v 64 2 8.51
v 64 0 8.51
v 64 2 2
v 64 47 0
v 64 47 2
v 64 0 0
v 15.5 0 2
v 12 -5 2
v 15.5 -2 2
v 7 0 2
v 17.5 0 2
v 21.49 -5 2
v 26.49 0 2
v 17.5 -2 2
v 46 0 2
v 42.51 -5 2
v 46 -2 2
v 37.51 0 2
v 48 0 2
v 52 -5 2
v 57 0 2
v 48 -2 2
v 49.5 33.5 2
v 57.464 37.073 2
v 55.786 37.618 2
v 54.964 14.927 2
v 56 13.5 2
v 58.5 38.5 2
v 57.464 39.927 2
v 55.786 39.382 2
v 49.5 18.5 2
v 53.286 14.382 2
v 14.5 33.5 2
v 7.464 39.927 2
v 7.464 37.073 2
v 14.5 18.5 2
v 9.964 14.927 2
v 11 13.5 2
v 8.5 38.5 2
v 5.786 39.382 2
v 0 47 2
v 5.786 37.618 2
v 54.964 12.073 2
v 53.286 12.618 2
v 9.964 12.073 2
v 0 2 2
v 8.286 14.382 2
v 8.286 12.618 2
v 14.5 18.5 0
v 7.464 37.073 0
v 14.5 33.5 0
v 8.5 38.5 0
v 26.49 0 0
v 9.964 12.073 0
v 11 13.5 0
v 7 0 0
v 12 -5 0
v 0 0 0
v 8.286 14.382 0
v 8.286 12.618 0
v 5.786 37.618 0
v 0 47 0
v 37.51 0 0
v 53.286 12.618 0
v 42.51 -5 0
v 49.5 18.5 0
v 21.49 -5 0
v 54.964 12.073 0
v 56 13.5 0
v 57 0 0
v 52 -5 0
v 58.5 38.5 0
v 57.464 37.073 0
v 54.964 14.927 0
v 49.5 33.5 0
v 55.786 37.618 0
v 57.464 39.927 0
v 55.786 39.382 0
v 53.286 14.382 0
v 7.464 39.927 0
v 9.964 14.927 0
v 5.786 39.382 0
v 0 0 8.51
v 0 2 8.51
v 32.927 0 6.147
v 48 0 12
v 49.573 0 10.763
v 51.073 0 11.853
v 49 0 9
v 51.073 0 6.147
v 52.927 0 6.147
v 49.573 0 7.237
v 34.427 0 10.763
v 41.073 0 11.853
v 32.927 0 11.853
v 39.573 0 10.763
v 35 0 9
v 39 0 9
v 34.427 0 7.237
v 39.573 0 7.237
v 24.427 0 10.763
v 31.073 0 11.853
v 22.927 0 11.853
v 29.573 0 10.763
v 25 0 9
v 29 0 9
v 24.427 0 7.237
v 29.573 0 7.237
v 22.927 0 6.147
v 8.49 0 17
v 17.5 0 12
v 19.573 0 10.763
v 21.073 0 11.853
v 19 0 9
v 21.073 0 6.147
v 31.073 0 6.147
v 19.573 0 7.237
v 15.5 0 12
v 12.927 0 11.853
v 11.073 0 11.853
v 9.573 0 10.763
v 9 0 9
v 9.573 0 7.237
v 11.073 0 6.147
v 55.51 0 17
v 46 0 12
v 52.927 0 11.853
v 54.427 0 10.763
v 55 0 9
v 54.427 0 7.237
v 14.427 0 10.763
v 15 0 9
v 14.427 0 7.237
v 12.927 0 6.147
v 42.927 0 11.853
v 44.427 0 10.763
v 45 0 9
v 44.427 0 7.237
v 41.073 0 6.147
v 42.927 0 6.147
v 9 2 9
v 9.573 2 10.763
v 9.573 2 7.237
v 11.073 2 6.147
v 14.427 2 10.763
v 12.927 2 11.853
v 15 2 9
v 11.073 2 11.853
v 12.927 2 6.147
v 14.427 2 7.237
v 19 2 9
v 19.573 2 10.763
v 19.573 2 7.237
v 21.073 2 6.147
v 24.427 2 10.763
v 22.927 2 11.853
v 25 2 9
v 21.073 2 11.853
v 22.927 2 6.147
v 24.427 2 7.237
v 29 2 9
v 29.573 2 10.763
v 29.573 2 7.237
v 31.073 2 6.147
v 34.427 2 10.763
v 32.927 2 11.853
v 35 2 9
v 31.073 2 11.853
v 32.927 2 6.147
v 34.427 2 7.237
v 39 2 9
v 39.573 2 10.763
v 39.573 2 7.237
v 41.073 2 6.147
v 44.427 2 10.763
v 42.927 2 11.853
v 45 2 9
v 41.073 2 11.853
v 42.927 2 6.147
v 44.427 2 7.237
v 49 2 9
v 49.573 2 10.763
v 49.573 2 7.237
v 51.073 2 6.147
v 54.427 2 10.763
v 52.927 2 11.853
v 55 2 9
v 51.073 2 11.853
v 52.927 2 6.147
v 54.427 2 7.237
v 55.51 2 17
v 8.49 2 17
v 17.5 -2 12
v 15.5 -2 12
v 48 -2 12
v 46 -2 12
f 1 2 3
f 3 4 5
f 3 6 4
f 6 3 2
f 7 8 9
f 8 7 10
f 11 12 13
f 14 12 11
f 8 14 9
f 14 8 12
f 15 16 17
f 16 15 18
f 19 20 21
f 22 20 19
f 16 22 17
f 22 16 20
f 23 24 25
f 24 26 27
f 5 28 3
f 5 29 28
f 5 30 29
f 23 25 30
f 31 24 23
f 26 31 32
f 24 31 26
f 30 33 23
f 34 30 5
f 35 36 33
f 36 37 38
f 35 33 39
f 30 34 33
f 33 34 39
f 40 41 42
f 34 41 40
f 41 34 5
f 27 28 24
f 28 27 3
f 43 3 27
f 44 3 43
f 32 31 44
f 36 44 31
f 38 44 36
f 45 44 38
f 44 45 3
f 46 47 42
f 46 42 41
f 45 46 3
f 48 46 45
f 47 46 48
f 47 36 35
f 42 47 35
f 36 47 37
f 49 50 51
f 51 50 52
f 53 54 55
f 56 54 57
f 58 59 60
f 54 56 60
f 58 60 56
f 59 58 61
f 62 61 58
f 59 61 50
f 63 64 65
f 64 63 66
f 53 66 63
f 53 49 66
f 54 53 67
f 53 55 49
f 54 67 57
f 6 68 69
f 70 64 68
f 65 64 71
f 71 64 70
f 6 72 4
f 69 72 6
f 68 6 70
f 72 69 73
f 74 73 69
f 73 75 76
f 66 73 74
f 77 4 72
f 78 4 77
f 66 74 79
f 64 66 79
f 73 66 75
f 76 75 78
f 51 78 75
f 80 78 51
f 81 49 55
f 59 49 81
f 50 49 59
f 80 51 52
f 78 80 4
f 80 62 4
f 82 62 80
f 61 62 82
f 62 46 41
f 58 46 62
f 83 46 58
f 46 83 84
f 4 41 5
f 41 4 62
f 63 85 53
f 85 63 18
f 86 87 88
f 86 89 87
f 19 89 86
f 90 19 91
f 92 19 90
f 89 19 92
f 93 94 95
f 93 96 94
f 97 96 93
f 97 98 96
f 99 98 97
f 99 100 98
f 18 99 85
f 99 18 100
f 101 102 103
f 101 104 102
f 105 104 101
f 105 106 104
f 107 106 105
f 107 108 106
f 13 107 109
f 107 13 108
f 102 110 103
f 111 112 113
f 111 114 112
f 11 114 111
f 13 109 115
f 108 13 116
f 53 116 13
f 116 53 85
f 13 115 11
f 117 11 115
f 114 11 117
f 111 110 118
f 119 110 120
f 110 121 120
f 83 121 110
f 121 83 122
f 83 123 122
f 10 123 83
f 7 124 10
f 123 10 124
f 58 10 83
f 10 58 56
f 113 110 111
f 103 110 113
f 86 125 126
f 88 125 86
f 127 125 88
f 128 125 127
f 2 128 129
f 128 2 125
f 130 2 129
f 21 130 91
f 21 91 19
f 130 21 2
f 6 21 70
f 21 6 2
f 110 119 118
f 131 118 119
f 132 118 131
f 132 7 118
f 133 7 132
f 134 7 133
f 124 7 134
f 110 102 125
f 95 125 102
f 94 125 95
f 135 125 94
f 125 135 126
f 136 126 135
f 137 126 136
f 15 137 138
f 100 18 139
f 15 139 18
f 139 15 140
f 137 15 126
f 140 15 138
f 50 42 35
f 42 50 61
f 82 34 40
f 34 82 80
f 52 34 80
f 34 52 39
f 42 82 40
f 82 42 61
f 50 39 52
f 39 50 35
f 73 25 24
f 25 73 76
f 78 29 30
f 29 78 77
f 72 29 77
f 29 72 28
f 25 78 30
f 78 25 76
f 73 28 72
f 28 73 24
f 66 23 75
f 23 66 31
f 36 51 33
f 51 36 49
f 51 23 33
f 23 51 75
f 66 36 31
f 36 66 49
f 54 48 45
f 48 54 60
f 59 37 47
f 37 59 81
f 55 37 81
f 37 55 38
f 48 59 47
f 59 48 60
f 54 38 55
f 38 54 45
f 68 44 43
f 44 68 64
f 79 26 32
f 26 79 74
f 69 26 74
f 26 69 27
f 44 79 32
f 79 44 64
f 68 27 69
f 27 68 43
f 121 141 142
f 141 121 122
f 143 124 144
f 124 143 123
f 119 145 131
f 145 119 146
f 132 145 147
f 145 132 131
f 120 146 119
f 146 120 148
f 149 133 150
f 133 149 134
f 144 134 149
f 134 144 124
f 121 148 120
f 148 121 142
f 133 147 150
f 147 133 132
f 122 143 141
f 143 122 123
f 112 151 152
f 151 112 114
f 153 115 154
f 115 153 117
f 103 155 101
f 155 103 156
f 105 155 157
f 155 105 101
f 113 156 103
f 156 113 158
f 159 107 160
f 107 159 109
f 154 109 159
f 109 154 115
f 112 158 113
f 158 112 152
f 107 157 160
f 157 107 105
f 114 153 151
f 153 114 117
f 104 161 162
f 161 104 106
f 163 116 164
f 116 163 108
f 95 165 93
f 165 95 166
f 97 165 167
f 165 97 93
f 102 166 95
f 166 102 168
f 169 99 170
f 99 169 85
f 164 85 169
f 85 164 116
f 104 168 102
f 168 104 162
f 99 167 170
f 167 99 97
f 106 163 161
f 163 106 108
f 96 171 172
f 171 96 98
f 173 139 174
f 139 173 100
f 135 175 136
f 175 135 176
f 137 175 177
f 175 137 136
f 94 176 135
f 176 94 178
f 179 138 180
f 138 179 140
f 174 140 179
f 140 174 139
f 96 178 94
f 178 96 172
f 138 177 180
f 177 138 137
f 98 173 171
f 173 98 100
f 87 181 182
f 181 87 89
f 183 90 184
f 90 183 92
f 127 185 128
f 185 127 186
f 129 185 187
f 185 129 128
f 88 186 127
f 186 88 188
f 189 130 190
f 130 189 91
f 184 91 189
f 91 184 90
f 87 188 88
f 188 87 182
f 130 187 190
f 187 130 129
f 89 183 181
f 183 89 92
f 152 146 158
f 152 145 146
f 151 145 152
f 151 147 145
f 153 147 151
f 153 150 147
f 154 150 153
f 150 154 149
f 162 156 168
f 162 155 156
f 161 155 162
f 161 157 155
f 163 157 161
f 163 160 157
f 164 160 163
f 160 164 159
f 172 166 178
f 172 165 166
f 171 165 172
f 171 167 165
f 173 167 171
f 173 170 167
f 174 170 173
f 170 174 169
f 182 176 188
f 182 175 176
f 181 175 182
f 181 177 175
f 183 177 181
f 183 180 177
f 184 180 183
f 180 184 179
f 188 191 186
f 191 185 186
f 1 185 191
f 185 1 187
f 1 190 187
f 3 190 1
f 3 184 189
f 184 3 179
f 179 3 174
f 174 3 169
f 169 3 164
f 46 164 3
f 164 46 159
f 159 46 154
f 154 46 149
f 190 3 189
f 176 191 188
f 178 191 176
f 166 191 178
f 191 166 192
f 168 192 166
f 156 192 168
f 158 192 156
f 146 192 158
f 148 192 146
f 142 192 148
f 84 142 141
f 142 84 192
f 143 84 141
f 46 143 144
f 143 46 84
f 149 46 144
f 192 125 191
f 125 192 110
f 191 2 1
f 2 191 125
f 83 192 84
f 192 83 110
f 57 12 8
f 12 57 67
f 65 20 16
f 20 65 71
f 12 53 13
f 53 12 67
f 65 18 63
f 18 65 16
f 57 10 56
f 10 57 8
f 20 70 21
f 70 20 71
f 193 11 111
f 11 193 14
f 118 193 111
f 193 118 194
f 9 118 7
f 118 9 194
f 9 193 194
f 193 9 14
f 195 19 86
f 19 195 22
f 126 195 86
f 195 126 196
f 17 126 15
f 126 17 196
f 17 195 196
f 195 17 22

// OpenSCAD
difference() {
    cube([64, 47, 2]);

    translate([7, 38.5, -0.25]) cylinder(h = 2.5, r=1.5);
    translate([57, 38.5, -0.25]) cylinder(h = 2.5, r=1.5);
    
    translate([14.5, 18.5, -0.25]) cube([35 , 15, 2.5]);
    
    translate([9.5, 13.5, -0.25]) cylinder(h = 2.5, r=1.5);
    translate([54.5, 13.5, -0.25]) cylinder(h = 2.5, r=1.5);
}


// unten
rotate([90, 0, 0]) translate([0, 0, -2])
intersection(){
     translate([32, -50, -0.25]) rotate([0, 0, 45]) cube([64, 64, 2.5]);
     difference() {
        cube([64, 17, 2]);
        for (a =[5:1]){
            translate([a*10+2, 9, -0.25]) cylinder(h = 2.5, r=3);
        }
    }
}
// end unten

// untere stütze
translate([15.5, -2, 2]) cube([2, 2, 10]);
translate([46, -2, 2]) cube([2, 2, 10]);
intersection(){
    difference() {  
        translate([0, -5, 0]) cube([64, 6, 2]);
        translate([32, -85, -0.25]) rotate([0, 0, 45]) cube([64, 64, 2.5]);
    }
    translate([32, -25, -0.25]) rotate([0, 0, 45]) cube([64, 64, 2.5]);
}
// end untere stüztze
